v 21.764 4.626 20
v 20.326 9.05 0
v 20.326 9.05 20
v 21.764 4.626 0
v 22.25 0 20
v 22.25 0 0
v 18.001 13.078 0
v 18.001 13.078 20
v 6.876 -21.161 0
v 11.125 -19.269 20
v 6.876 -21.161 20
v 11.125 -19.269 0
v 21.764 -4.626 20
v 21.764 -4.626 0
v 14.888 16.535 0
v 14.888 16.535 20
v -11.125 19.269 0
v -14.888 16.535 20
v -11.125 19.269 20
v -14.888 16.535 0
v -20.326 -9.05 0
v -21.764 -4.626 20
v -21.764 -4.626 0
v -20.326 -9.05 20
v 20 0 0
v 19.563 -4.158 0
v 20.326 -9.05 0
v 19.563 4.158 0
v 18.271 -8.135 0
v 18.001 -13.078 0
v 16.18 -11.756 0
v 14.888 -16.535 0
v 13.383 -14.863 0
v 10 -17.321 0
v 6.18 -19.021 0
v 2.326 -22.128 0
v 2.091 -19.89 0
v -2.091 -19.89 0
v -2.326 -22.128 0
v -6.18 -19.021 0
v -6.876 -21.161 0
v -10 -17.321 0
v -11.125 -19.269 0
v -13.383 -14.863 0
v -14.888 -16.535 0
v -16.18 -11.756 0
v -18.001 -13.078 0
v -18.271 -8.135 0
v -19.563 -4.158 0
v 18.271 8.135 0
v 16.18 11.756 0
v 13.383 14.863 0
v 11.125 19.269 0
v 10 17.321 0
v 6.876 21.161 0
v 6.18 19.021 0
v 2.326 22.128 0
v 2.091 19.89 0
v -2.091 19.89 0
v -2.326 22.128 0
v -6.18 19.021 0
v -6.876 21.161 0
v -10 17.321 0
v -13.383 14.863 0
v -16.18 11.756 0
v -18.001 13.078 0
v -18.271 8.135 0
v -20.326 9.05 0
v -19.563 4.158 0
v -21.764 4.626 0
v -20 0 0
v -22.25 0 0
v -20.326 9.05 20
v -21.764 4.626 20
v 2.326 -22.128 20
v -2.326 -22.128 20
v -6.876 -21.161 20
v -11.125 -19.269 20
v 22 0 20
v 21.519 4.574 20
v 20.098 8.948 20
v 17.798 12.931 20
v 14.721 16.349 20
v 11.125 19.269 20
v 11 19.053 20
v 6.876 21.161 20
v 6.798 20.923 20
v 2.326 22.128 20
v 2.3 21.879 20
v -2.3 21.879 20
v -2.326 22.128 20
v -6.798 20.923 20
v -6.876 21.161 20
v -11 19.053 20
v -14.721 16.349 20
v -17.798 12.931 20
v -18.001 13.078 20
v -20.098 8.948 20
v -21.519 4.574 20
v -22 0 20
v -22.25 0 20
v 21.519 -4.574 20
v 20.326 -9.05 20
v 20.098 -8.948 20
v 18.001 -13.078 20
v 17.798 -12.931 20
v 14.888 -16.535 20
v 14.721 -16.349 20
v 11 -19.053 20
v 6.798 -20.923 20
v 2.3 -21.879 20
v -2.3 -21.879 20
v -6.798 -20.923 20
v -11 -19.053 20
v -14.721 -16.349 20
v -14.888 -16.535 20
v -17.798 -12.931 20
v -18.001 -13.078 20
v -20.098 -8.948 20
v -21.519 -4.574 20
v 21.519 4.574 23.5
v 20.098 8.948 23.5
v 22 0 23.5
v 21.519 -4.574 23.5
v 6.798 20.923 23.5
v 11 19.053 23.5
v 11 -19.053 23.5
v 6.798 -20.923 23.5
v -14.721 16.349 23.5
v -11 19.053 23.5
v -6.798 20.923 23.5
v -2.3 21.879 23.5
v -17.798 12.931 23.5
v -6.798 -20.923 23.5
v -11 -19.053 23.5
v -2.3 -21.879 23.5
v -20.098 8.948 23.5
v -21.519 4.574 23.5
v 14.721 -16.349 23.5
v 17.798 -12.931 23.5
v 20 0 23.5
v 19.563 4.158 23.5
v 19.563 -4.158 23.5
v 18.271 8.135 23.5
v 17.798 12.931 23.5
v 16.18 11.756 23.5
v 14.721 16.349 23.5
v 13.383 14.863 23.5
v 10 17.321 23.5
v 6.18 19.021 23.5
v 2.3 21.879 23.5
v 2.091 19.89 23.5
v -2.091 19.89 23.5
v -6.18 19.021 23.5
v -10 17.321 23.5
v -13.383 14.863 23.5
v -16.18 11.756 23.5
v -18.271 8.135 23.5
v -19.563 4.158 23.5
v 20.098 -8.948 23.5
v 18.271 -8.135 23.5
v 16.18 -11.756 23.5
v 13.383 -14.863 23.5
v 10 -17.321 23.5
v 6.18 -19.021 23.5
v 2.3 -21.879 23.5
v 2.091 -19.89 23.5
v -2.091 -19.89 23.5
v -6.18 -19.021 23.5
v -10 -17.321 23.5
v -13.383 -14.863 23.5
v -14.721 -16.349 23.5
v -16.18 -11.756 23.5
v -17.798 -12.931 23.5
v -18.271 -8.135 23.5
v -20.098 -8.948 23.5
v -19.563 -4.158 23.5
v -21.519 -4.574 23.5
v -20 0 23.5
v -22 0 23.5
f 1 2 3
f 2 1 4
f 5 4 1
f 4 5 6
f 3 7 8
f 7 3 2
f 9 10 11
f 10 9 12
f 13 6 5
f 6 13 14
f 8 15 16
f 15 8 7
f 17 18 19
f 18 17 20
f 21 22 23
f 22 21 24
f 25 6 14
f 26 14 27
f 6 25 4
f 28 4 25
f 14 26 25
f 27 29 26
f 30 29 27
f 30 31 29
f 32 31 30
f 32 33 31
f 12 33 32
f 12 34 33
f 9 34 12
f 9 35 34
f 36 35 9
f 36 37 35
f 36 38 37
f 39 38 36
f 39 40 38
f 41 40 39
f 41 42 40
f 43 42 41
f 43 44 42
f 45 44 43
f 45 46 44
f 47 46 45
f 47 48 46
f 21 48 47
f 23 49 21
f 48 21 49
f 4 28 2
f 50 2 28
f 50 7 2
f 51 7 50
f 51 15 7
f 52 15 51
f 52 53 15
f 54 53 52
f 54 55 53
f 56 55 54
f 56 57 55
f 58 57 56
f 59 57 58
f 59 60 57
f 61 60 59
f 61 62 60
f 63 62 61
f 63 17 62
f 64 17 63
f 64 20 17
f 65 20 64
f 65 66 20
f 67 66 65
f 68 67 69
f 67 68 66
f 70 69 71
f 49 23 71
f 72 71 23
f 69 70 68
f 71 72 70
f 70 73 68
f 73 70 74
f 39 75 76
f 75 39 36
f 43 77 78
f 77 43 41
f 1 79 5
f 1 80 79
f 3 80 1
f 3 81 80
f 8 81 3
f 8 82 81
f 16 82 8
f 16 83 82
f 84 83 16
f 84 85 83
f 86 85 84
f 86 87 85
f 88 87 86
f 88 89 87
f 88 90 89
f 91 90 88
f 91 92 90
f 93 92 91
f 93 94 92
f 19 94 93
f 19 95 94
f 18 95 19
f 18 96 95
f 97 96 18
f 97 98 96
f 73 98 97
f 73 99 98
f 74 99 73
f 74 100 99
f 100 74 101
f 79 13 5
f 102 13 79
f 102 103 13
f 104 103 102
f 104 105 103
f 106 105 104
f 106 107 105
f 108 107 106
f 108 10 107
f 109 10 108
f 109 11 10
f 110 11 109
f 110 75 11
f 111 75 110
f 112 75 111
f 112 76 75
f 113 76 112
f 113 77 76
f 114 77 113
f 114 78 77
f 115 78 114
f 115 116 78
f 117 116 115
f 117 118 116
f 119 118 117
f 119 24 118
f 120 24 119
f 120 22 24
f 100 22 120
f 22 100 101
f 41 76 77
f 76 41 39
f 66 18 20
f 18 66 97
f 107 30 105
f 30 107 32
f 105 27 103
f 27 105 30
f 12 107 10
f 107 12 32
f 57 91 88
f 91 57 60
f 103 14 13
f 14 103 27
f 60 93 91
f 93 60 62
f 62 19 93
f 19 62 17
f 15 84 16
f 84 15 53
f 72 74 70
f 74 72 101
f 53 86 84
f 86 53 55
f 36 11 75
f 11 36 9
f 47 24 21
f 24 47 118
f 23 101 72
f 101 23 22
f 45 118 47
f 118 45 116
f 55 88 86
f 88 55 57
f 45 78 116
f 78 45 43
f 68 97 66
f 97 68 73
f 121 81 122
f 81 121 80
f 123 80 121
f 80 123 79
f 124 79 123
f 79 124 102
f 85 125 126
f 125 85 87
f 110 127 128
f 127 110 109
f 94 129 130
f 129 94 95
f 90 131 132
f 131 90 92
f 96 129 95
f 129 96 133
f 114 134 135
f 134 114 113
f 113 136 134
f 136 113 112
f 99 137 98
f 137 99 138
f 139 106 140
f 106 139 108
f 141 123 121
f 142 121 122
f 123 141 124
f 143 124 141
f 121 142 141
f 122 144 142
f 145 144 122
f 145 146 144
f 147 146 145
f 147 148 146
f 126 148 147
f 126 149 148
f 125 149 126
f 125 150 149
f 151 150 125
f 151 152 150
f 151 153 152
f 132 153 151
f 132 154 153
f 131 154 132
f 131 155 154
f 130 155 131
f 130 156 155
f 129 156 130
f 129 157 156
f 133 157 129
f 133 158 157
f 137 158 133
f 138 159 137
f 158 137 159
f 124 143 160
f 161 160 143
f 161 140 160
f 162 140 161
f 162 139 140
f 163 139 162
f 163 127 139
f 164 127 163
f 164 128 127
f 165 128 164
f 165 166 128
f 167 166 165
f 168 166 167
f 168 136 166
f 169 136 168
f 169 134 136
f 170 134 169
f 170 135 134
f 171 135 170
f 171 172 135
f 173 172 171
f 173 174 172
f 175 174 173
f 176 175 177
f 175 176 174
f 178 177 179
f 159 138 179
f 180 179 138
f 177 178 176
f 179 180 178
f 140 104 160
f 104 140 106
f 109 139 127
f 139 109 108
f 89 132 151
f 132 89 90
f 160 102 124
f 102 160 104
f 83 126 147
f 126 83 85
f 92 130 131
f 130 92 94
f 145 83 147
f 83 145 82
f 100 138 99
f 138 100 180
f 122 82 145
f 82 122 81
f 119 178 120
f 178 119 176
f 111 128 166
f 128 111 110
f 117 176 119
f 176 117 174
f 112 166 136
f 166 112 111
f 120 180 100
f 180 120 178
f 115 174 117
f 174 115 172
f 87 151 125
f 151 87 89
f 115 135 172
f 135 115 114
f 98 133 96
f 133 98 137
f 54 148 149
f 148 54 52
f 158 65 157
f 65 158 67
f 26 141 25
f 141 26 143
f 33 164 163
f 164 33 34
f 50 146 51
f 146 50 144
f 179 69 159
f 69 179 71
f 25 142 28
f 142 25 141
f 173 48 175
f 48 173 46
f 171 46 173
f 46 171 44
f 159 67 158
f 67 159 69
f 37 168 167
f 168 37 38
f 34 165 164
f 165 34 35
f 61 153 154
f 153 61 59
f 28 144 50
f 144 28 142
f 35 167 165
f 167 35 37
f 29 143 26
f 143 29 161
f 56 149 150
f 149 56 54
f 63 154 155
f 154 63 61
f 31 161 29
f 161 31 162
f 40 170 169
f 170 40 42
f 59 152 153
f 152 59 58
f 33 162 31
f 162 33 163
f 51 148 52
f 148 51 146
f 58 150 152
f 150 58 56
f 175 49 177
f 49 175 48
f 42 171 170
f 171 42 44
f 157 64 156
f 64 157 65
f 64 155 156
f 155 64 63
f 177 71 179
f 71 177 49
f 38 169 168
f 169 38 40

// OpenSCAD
// wallhole is 44.5 mm
// backhole is 44mm

wallr = 44.5 / 2;
backr = 44 / 2;
innerr = 20; // FIXME strengthen for final version once fitted
wlen = 20;
bowllen = 3.5;
difference(){
	union(){
		// part that plugs into wall
		cylinder(wlen, wallr, wallr);
		translate([0, 0, wlen]){
			// part that plugs into bowlback
			cylinder(bowllen, backr, backr);
		}
	}
	// big hole through all of it
	cylinder(wlen + bowllen, innerr, innerr);
}
